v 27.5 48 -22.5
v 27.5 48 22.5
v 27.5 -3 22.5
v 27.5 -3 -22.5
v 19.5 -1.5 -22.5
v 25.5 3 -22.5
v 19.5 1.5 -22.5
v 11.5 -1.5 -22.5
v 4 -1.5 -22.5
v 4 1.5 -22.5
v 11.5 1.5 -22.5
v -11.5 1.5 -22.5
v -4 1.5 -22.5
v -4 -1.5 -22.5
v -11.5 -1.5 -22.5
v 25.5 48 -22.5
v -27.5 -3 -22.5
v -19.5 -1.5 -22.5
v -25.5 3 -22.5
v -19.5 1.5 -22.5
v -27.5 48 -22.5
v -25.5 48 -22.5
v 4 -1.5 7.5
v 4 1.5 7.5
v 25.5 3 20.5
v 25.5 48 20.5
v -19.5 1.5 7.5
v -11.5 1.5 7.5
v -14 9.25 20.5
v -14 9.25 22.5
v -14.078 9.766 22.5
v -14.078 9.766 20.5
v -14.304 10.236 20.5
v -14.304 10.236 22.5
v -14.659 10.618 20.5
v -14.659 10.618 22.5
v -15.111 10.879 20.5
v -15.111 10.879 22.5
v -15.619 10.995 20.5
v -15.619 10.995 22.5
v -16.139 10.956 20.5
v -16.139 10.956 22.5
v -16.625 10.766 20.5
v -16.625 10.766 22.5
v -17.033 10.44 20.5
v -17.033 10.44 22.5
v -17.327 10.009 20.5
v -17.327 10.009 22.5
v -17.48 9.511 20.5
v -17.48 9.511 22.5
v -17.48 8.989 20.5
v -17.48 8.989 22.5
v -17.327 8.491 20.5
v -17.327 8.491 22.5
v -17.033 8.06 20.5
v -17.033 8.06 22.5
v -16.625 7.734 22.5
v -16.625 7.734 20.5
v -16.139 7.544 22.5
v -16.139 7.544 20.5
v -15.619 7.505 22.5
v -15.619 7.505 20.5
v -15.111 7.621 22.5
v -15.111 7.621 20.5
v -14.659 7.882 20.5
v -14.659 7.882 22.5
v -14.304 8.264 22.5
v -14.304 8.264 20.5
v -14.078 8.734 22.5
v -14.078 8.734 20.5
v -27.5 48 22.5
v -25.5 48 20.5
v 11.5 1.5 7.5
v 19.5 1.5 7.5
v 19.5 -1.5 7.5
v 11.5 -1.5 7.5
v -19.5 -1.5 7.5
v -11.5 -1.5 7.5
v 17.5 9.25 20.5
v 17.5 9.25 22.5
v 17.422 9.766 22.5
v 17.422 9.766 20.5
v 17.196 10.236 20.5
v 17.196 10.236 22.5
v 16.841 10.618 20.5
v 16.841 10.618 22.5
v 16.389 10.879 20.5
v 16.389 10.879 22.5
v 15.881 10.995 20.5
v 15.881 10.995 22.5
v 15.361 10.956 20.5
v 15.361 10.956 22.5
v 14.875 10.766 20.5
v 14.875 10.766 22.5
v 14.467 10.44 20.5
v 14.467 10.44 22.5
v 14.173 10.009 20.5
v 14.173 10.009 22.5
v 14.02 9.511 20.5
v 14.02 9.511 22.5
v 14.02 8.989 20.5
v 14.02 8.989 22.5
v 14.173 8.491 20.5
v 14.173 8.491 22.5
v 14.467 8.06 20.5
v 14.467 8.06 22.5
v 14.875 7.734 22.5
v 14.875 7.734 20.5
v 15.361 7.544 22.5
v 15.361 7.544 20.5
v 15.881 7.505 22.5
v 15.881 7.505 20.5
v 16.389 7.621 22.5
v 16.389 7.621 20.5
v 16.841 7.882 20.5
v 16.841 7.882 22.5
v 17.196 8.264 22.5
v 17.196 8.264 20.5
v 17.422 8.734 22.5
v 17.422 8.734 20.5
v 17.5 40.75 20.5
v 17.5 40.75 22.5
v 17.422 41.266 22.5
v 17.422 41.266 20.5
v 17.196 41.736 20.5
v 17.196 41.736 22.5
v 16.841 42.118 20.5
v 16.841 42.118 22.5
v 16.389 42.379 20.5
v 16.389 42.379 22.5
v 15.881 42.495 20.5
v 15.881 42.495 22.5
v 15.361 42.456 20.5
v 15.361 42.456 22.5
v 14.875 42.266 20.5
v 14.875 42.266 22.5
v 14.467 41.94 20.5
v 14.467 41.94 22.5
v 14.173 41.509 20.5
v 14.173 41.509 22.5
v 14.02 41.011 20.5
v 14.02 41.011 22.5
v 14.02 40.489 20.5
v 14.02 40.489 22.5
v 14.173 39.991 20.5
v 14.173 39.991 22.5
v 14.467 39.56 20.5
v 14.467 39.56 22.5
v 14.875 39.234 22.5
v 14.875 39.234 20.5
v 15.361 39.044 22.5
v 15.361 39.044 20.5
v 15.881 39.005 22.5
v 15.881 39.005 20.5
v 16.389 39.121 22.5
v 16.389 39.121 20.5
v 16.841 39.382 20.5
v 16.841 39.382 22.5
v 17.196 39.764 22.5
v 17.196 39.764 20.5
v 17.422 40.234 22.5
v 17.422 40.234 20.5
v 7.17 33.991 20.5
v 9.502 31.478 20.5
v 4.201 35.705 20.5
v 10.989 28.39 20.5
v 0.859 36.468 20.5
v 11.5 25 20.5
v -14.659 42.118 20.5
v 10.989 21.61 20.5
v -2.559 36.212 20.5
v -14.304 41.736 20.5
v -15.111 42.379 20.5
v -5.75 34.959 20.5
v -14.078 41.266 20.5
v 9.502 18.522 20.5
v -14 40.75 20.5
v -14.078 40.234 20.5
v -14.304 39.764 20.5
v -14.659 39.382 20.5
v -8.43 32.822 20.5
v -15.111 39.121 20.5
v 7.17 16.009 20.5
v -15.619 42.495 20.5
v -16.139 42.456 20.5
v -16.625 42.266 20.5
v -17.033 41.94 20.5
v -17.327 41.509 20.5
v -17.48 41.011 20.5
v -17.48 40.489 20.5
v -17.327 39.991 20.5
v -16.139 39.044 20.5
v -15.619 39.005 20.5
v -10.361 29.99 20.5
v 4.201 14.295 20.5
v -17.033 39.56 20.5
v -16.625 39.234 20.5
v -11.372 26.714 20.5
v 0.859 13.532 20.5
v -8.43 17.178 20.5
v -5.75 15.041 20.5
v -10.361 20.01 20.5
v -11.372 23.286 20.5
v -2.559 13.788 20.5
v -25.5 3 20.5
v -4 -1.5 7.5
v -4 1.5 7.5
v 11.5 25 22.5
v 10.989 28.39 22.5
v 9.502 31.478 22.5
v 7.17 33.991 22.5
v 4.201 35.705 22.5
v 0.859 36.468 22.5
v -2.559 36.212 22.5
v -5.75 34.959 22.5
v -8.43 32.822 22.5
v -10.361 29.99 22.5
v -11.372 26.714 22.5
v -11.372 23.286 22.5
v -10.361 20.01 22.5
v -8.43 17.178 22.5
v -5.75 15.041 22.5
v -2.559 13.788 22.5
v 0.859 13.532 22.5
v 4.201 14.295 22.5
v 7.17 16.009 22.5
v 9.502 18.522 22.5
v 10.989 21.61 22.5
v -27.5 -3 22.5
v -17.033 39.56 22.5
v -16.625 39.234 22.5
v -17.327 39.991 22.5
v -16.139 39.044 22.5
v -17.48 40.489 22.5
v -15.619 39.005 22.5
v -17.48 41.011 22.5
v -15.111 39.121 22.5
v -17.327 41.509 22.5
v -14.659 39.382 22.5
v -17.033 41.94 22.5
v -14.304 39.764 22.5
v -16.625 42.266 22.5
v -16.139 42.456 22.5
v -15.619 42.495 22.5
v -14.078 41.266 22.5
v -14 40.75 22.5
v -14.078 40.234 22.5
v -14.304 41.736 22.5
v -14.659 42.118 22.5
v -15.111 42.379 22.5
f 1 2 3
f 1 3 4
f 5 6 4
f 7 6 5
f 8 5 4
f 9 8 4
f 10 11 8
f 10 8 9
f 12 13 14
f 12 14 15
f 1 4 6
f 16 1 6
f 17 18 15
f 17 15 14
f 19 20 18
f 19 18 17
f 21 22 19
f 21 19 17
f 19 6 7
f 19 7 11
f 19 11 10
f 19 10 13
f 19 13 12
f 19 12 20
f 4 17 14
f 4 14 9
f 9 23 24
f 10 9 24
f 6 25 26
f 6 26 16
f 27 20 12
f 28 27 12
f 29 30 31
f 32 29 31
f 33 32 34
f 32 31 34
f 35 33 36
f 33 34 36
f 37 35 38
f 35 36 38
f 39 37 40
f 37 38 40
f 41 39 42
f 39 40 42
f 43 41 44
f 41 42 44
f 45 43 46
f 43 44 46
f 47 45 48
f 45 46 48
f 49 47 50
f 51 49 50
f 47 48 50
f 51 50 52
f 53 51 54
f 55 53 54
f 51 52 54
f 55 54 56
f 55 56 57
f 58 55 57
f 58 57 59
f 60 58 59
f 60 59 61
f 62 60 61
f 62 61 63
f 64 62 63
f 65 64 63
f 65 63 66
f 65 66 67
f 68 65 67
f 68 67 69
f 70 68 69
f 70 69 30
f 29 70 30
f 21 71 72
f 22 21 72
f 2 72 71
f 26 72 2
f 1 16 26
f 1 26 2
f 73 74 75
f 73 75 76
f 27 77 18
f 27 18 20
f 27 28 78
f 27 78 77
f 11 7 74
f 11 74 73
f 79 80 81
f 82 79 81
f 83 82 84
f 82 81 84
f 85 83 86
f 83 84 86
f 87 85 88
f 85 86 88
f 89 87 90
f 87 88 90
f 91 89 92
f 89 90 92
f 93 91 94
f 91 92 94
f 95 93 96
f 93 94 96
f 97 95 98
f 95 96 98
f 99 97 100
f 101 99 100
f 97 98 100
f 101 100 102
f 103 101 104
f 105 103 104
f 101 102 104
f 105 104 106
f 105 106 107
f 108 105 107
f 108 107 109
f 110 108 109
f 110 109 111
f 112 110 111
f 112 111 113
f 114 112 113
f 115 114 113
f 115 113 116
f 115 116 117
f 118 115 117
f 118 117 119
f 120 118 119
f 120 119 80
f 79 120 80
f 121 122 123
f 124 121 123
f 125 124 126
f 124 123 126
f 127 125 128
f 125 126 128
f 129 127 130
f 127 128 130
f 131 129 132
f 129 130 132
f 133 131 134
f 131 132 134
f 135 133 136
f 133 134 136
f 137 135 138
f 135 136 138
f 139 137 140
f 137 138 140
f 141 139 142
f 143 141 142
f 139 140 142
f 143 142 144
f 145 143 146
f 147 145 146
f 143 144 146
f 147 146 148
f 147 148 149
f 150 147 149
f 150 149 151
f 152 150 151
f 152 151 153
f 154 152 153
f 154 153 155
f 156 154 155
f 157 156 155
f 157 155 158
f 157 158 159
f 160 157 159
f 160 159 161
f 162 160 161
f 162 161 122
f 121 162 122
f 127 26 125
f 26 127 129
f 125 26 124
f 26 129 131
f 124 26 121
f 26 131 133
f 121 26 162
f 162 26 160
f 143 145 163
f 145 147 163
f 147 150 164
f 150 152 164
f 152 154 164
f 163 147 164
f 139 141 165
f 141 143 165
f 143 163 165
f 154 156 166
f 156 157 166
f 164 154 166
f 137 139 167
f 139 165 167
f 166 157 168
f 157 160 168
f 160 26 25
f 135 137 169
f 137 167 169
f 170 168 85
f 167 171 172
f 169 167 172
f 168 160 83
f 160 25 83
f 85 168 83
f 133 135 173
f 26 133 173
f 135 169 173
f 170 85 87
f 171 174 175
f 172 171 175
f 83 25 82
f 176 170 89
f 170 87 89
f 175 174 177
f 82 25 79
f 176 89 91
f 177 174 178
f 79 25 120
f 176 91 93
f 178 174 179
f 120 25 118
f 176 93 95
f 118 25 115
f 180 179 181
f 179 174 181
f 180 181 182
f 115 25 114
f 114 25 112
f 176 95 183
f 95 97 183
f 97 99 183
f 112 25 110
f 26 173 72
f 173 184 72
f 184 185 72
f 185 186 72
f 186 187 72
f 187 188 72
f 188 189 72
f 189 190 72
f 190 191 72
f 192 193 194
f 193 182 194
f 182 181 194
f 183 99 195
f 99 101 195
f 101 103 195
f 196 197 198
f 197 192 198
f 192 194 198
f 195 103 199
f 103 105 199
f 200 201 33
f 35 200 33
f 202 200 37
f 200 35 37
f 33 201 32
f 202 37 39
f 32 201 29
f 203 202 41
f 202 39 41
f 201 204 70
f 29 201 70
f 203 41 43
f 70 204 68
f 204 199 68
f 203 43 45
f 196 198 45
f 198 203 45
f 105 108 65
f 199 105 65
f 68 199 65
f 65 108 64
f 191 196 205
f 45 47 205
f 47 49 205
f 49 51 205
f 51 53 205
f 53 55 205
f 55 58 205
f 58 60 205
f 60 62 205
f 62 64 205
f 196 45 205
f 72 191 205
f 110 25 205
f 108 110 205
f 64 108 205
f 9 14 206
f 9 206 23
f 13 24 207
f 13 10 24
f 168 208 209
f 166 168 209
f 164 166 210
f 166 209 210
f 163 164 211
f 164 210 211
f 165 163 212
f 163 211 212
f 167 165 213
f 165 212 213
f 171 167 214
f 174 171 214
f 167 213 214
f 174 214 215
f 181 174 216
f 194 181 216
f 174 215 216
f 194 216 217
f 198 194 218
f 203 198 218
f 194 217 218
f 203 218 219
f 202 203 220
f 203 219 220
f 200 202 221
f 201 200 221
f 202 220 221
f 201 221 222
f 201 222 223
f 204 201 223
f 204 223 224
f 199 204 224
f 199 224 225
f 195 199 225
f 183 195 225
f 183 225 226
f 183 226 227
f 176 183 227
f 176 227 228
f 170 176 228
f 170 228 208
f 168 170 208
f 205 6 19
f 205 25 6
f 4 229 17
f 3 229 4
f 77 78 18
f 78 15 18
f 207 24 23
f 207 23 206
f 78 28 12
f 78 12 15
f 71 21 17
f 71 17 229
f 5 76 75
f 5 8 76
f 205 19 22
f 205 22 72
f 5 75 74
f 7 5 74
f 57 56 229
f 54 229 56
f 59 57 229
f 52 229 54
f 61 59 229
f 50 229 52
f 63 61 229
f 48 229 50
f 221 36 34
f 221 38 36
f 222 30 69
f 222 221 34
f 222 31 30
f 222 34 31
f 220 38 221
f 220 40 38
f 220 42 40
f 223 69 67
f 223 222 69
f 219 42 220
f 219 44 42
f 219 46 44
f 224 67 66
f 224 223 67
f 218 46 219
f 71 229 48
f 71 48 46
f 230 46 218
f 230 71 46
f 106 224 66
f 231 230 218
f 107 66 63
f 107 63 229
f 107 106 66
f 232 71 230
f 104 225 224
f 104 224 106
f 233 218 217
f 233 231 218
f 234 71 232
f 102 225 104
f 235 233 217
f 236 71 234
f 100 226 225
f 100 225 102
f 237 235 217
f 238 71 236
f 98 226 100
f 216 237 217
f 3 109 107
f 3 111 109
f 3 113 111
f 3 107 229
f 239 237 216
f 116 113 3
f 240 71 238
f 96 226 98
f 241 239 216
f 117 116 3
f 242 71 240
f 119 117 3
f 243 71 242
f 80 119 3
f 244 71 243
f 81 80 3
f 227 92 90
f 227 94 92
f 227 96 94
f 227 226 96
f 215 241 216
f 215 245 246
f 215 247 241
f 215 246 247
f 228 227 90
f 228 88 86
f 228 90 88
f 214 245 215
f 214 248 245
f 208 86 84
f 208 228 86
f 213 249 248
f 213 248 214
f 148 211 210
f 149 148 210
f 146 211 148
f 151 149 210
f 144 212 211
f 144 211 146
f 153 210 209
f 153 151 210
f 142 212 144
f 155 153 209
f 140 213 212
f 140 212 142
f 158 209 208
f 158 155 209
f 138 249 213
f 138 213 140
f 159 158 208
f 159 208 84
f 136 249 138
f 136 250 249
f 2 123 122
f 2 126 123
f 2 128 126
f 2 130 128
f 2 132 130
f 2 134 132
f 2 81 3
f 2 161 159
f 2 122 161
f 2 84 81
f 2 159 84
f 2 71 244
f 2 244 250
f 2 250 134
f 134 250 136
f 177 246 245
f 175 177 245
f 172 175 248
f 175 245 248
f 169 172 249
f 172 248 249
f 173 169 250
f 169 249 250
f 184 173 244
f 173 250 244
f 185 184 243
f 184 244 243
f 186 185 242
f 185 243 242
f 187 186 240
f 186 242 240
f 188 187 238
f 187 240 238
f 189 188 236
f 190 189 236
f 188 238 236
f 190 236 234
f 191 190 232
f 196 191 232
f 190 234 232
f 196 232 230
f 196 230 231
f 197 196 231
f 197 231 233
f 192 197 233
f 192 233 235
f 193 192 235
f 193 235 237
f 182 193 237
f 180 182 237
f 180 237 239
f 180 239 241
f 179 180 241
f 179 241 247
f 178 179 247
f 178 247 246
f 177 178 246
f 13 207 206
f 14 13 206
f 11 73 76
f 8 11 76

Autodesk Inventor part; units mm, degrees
ref_plane "YZ Plane" through (0, 0, 0) normal (1, 0, 0) x (0, 1, 0)
ref_plane "XZ Plane" through (0, 0, 0) normal (0, 1, 0) x (-1, 0, 0)
ref_plane "XY Plane" through (0, 0, 0) normal (0, 0, 1) x (1, 0, 0)
sketch "Skizze1" plane through (0, 0, 0) normal (0, 1, 0) x (-1, 0, 0)
  line L0 (-27.5, 22.5) -> (27.5, 22.5)
  line L1 (27.5, 22.5) -> (27.5, -22.5)
  line L2 (27.5, -22.5) -> (-27.5, -22.5)
  line L3 (-27.5, -22.5) -> (-27.5, 22.5)
  line L4 (0, -31.5) -> (0, 31.5) projected
  line L5 (38.5, 0) -> (-38.5, 0) projected
  point P0 (0, 0)
  dimension "d0" = 55
  dimension "d1" = 45
extrude "Extrusion1" add sketch "Skizze1" along normal blind 3
sketch "Skizze2" plane through (0, 3, 0) normal (0, 1, 0) x (1, 0, 0)
  line L0 (-27.5, 22.5) -> (-27.5, -22.5) projected
  line L1 (27.5, -22.5) -> (27.5, 22.5) projected
  line L2 (-27.5, -22.5) -> (27.5, -22.5)
  line L3 (27.5, -22.5) -> (27.5, -20.5)
  line L4 (27.5, -20.5) -> (-27.5, -20.5)
  line L5 (-27.5, -20.5) -> (-27.5, -22.5)
  point P0 (0, 0)
  dimension "d4" = 2
extrude "Extrusion2" add sketch "Skizze2" along normal blind 45
sketch "Skizze3" plane through (-27.5, 0, 22.5) normal (0, 0, 1) x (1, 0, 0)
  circle A0 centre (27.5, 25) radius 11.5
  line L0 (0, 0) -> (55, 0) projected
  line L1 (55, 0) -> (55, 48) projected
  circle A1 centre (43.25, 9.25) radius 1.75
  circle A2 centre (11.75, 9.25) radius 1.75
  circle A3 centre (11.75, 40.75) radius 1.75
  circle A4 centre (43.25, 40.75) radius 1.75
  line L2 (0, 48) -> (55, 48) projected
  line L3 (27.5, 48) -> (27.5, 0)
  line L4 (4.6208, 25) -> (55, 25)
  dimension "d7" = 23
  dimension "d10" = 3.5
  dimension "d11" = 3.5
  dimension "d12" = 3.5
  dimension "d13" = 3.5
  dimension "d17" = 31.5
  dimension "d48" = 0
extrude "Extrusion3" cut sketch "Skizze3" against normal up to surface (2 mm away) contours L4 L3 A0 | A0 L3 L4 | L3 L4 A0 | A0 L4 L3 | A1 | A2 | A3 | A4
sketch "Skizze10" plane through (0, 3, 0) normal (0, 1, 0) x (1, 0, 0)
  line L0 (27.5, -20.5) -> (27.5, 22.5) projected
  line L1 (27.5, 22.5) -> (-27.5, 22.5) projected
  line L2 (27.5, -20.5) -> (25.5, -20.5)
  line L3 (25.5, -20.5) -> (25.5, 22.5)
  line L4 (25.5, 22.5) -> (27.5, 22.5)
  line L5 (27.5, 22.5) -> (27.5, -20.5)
  line L6 (27.5, -20.5) -> (-27.5, -20.5) projected
  line L7 (-27.5, 22.5) -> (-25.5, 22.5)
  line L8 (-25.5, 22.5) -> (-25.5, -20.5)
  line L9 (-25.5, -20.5) -> (-27.5, -20.5)
  line L10 (-27.5, -20.5) -> (-27.5, 22.5)
  point P0 (0, 0)
  point P1 (-27.5, -20.5)
  dimension "d43" = 2
  dimension "d44" = 2
extrude "Extrusion6" add sketch "Skizze10" along normal up to surface (45 mm away) contours L2 L3 L1 L0 | L6 L10 L1 L8
sketch "Skizze11" plane through (0, 0, 0) normal (0, -1, 0) x (1, 0, 0)
  line L0 (27.5, 22.5) -> (27.5, -22.5) projected
  line L1 (-27.5, 22.5) -> (27.5, 22.5) projected
  line L2 (27.5, -22.5) -> (-27.5, -22.5)
  line L3 (-27.5, -22.5) -> (-27.5, 22.5)
  line L4 (-27.5, 22.5) -> (27.5, 22.5)
  line L5 (27.5, 22.5) -> (27.5, -22.5)
  point P0 (0, 0)
extrude "Extrusion7" add sketch "Skizze11" along normal blind 3
sketch "Skizze12" plane through (25.5, 3, -22.5) normal (0, 0, -1) x (-1, 0, 0)
  line L0 (6, -1.5) -> (14, -1.5)
  line L1 (14, -1.5) -> (14, -4.5)
  line L2 (14, -4.5) -> (6, -4.5)
  line L3 (6, -4.5) -> (6, -1.5)
  line L4 (45, -1.5) -> (37, -1.5)
  line L5 (37, -1.5) -> (37, -4.5)
  line L6 (37, -4.5) -> (45, -4.5)
  line L7 (45, -4.5) -> (45, -1.5)
  line L8 (21.5, -1.5) -> (29.5, -1.5)
  line L9 (29.5, -1.5) -> (29.5, -4.5)
  line L10 (29.5, -4.5) -> (21.5, -4.5)
  line L11 (21.5, -4.5) -> (21.5, -1.5)
  line L12 (0, 0) -> (51, 0) projected
  line L13 (-2, -6) -> (-2, 45) projected
  line L14 (53, 45) -> (53, -6) projected
  point P0 (25.5, -3)
  dimension "d52" = 8
  dimension "d53" = 3
  dimension "d54" = 8
  dimension "d55" = 3
  dimension "d56" = 8
  dimension "d57" = 3
  dimension "d58" = 1.5
  dimension "d59" = 1.5
  dimension "d60" = 1.5
  dimension "d61" = 8
  dimension "d62" = 8
  dimension "d63" = 7.5
extrude "Extrusion8" cut sketch "Skizze12" against normal blind 30
properties part number "Motorhalterung_v2"
